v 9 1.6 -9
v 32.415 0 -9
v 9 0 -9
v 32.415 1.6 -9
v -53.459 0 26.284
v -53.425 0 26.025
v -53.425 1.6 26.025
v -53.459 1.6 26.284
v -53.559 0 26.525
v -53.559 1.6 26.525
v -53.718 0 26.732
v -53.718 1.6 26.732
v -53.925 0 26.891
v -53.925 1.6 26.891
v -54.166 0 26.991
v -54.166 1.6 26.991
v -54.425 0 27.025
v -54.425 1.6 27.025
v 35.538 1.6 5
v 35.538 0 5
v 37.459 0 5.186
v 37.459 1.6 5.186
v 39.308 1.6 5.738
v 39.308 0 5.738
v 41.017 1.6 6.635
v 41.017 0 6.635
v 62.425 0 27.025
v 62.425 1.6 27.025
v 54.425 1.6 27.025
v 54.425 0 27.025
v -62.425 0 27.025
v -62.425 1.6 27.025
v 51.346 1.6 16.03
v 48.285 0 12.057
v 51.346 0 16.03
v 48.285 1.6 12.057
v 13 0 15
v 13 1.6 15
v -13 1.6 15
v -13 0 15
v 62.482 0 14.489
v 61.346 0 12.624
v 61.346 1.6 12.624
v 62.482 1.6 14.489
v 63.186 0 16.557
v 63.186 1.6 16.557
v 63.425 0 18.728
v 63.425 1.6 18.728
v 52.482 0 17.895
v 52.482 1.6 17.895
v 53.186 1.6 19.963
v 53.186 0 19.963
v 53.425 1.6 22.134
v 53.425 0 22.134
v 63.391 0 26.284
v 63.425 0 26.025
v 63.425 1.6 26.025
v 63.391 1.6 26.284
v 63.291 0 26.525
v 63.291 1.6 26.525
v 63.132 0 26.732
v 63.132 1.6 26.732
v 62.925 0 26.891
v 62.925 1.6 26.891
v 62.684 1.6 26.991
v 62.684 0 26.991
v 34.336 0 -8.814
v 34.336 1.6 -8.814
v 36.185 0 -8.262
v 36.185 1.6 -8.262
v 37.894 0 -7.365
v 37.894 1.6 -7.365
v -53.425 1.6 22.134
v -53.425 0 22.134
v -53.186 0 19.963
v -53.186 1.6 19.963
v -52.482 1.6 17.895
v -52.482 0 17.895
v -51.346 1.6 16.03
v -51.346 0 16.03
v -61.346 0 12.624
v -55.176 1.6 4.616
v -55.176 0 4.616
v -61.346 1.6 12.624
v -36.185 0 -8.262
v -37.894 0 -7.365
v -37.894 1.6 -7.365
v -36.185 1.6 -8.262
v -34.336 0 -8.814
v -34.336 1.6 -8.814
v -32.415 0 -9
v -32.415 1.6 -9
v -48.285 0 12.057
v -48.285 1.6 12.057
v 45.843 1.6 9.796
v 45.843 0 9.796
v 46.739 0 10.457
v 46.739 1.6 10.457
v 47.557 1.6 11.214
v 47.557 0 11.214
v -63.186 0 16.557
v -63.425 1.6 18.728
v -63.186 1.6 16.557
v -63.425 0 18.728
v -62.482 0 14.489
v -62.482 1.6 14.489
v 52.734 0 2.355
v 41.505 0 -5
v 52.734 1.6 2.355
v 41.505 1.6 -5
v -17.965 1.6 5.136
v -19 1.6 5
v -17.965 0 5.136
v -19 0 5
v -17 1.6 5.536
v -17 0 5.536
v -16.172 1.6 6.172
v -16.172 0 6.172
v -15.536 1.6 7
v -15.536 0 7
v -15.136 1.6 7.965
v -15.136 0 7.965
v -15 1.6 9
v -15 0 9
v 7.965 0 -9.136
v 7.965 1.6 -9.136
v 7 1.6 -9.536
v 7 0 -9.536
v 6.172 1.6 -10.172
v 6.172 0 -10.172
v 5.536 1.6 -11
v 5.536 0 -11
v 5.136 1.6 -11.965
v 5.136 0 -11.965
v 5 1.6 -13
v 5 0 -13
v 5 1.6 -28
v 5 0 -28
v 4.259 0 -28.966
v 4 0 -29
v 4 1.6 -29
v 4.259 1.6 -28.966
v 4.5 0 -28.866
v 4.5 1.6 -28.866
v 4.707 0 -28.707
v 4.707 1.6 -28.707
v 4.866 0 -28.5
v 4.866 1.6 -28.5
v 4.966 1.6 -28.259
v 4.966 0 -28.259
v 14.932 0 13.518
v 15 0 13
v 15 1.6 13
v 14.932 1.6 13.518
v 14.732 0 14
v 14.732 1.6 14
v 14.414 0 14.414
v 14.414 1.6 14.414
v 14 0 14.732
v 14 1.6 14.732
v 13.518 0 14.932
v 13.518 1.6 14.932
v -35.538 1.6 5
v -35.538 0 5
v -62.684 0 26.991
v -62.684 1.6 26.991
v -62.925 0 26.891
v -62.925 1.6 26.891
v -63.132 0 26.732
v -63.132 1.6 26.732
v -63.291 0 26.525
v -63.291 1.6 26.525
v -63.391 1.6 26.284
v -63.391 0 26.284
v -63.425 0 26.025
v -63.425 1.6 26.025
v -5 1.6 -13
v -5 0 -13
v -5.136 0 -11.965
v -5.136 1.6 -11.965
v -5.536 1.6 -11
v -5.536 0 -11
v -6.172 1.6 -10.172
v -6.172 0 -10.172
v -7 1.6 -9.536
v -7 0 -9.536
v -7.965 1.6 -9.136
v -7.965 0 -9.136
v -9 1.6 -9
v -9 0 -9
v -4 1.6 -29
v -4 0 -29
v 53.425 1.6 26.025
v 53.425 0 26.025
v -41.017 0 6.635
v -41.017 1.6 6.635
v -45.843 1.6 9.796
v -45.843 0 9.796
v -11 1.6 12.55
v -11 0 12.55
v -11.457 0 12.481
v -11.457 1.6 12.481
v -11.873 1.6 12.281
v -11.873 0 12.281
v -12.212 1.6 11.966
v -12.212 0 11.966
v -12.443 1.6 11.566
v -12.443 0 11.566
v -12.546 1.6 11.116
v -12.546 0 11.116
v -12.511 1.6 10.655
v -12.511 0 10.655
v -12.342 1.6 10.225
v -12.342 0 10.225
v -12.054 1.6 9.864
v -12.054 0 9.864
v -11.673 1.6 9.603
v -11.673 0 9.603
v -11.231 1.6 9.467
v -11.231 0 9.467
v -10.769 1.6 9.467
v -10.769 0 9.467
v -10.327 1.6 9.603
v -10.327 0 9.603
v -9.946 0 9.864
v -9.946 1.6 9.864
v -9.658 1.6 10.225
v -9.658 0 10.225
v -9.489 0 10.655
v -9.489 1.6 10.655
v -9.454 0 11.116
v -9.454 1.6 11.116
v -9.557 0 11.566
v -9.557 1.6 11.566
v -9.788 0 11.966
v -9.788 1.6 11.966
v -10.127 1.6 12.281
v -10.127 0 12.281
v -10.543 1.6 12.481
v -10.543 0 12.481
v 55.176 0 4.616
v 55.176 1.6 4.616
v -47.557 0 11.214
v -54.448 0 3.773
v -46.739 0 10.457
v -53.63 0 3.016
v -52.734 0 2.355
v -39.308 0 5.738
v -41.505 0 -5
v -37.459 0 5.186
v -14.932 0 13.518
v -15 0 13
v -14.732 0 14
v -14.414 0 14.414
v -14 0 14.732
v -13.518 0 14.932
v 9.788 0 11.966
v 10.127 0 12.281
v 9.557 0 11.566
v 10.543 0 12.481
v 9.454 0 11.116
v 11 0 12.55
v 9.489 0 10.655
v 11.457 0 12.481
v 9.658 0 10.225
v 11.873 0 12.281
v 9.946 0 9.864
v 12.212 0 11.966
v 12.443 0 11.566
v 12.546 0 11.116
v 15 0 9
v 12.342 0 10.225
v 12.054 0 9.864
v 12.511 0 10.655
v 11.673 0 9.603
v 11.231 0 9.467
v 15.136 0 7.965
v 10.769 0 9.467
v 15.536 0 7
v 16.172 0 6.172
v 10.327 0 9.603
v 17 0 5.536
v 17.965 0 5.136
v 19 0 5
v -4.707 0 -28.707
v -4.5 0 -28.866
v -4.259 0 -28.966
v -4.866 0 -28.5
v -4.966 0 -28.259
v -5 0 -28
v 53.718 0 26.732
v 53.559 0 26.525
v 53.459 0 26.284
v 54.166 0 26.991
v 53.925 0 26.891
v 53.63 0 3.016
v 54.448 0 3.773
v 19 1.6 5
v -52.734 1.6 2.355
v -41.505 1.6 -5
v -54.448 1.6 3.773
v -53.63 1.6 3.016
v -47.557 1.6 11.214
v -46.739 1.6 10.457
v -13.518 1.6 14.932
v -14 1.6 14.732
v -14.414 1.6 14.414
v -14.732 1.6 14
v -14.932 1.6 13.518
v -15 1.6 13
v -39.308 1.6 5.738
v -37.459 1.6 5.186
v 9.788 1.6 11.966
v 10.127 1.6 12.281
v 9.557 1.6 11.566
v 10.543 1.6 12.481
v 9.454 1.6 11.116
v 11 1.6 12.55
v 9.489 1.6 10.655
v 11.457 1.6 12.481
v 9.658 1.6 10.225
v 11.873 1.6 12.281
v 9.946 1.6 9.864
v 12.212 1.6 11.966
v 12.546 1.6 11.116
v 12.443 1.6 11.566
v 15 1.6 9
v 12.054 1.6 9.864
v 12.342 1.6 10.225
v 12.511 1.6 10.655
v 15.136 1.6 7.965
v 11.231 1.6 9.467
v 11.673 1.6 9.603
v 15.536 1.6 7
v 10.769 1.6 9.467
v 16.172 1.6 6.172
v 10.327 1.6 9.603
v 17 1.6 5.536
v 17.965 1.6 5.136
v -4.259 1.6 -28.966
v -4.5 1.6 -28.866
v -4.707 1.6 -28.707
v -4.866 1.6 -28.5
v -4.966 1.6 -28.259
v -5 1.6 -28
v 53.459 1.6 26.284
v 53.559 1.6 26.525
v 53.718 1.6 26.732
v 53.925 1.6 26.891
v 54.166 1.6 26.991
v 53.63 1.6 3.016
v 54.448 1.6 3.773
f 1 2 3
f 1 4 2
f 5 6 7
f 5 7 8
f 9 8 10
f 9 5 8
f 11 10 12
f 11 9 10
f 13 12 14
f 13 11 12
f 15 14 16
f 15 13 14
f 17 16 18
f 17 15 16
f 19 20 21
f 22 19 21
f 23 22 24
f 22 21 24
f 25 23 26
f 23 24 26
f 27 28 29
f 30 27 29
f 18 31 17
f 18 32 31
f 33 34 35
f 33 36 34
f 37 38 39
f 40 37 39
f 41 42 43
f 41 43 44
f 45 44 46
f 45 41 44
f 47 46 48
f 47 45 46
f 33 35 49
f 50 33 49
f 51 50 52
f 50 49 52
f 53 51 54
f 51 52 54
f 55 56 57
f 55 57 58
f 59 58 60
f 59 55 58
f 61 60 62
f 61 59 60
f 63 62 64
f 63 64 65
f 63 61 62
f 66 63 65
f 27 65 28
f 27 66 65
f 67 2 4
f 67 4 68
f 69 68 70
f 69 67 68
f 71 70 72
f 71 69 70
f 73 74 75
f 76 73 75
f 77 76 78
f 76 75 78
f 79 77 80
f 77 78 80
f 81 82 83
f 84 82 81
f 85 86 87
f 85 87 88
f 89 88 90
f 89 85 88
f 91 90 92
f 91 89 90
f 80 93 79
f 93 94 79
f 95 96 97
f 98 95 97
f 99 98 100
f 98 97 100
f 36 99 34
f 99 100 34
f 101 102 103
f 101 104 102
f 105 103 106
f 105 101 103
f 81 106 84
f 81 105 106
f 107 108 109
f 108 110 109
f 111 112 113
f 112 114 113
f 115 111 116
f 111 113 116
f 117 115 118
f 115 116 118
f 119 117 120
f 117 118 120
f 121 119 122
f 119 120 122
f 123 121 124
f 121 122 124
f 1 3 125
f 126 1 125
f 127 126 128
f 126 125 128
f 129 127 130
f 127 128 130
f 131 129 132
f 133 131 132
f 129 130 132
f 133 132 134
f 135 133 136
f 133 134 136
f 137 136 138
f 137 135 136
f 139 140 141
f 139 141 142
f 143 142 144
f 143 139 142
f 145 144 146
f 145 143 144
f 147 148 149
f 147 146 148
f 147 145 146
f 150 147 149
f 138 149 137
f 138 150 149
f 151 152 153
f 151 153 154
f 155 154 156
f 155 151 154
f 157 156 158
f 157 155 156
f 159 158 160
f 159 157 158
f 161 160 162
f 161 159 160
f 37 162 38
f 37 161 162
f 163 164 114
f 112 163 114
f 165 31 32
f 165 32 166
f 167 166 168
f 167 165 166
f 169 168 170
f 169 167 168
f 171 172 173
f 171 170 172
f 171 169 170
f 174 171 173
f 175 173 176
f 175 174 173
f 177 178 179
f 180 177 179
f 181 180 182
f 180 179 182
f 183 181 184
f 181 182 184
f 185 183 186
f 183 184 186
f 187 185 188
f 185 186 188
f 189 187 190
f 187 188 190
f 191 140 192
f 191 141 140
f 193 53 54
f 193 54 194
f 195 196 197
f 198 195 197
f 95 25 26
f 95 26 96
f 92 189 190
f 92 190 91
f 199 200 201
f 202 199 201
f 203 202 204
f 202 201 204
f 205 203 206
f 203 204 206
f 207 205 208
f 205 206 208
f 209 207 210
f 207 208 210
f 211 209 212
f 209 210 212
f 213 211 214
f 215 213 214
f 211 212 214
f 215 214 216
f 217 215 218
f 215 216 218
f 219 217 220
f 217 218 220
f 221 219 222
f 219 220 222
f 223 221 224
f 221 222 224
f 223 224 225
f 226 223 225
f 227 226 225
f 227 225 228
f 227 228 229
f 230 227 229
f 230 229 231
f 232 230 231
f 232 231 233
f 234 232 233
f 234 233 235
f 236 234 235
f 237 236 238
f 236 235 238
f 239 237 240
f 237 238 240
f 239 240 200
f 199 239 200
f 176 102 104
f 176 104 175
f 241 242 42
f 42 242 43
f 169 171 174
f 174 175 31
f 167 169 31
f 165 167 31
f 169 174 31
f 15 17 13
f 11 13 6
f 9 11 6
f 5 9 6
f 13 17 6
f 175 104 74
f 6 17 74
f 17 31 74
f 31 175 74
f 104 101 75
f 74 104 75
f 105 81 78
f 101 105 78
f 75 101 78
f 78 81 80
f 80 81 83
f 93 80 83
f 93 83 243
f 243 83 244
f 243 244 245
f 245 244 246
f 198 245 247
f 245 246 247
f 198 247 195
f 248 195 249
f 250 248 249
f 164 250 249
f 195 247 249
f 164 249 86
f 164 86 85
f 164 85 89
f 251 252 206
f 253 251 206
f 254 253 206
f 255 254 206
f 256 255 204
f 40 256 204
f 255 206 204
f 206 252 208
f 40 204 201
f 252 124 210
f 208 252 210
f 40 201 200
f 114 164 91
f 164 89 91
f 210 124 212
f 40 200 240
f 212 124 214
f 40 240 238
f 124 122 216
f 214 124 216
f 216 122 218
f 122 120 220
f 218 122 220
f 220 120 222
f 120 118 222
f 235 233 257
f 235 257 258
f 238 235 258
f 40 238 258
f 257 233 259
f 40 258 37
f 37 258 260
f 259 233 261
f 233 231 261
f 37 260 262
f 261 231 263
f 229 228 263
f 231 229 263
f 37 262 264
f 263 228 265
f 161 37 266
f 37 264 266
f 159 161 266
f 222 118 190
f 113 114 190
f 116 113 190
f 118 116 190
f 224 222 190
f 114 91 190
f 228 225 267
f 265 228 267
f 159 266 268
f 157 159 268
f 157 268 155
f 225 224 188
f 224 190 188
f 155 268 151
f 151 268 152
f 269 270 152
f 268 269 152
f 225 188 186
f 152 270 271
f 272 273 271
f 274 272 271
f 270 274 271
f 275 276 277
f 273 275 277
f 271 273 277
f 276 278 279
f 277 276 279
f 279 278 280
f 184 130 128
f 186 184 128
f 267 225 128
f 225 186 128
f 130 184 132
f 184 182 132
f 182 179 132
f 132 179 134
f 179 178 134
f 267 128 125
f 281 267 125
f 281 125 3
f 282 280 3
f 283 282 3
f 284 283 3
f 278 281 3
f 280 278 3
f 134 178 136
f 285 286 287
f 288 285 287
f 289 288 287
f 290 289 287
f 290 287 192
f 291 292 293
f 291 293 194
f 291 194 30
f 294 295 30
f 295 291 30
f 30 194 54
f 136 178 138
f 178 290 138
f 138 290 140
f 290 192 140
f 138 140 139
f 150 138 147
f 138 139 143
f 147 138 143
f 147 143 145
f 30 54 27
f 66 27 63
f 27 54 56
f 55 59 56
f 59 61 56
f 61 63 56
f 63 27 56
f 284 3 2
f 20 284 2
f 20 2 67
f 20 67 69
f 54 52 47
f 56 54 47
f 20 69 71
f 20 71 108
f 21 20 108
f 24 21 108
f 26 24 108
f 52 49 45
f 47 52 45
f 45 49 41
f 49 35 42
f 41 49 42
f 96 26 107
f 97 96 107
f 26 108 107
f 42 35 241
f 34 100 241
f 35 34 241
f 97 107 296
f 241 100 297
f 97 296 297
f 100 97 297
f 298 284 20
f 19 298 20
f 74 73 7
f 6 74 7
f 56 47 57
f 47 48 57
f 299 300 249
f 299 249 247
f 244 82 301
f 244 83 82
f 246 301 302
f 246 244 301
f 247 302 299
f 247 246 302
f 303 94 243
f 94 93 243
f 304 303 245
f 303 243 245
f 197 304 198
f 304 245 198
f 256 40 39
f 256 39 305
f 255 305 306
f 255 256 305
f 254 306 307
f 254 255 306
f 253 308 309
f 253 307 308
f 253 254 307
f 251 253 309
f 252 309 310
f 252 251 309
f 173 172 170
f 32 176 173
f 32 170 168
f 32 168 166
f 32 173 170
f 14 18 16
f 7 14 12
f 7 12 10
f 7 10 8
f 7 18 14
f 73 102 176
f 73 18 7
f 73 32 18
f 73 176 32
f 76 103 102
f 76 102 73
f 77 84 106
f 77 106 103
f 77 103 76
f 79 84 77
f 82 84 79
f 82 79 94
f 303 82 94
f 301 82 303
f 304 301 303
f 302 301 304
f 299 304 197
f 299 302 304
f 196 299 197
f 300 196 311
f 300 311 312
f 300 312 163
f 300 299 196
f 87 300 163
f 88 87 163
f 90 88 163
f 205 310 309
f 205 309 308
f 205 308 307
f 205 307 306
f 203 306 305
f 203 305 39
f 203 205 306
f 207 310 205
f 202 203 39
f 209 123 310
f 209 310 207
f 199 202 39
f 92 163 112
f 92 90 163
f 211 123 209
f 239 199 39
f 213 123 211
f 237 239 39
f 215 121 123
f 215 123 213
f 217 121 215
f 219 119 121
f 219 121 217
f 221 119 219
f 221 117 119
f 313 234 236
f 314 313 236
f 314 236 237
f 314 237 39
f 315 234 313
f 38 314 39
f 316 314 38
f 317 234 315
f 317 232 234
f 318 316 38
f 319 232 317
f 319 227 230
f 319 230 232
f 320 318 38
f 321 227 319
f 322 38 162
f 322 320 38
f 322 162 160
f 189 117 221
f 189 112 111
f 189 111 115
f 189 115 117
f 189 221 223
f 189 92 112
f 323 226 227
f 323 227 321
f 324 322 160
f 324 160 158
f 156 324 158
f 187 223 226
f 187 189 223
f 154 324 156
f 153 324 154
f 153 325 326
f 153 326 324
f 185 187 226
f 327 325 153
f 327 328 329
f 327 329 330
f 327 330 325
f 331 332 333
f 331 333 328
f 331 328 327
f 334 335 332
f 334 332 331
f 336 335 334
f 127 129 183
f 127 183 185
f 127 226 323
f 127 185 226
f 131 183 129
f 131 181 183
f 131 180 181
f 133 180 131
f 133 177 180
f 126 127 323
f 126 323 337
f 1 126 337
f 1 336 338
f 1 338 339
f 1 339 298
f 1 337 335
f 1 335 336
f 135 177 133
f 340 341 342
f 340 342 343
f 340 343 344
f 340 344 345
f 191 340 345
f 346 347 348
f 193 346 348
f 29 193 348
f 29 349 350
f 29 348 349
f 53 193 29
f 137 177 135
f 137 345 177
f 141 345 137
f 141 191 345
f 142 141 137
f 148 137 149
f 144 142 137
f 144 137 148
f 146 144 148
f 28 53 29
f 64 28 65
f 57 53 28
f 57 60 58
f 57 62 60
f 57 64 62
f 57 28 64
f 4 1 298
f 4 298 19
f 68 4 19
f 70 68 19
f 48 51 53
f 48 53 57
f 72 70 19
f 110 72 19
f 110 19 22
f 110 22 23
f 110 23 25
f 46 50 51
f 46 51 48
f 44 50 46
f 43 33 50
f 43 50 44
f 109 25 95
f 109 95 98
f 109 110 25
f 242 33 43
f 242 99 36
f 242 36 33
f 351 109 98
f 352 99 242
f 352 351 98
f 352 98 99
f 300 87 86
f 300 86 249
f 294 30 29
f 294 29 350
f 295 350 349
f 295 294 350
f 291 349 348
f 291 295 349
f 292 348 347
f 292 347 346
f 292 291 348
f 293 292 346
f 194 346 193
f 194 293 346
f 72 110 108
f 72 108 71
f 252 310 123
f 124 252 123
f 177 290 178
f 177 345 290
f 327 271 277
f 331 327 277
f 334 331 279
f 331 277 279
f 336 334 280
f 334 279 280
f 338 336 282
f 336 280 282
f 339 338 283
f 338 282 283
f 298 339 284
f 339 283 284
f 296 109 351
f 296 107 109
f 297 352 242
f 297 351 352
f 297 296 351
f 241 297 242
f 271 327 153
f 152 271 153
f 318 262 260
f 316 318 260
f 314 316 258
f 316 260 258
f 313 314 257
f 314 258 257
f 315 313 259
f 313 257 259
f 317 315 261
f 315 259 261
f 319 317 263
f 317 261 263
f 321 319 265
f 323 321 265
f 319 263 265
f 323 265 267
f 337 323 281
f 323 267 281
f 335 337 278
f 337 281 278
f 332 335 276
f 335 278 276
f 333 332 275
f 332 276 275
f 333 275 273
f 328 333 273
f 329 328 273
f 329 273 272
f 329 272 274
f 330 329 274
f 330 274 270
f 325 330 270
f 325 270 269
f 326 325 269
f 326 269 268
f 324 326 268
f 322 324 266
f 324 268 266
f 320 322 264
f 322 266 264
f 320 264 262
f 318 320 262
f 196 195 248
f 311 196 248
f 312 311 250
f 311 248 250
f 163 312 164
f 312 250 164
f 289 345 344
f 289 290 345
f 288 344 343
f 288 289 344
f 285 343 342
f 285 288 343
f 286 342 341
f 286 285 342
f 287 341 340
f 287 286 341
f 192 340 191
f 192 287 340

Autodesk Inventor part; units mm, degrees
ref_plane "YZ Plane" through (0, 0, 0) normal (1, 0, 0) x (0, 1, 0)
ref_plane "XZ Plane" through (0, 0, 0) normal (0, 1, 0) x (-1, 0, 0)
ref_plane "XY Plane" through (0, 0, 0) normal (0, 0, 1) x (1, 0, 0)
sketch "Szkic2" plane through (0, 0, 0) normal (0, 1, 0) x (-1, 0, 0)
  line L0 (47.5, 5) -> (-47.5, 5)
  line L1 (-47.5, 5) -> (-47.5, -5)
  line L2 (-47.5, -5) -> (47.5, -5)
  line L3 (47.5, -5) -> (47.5, 5)
  line L4 (47.5, 5) -> (-47.5, -5) construction
  line L5 (-47.5, 5) -> (47.5, -5) construction
  line L6 (0, 24) -> (0, -27)
  point P0 (0, 0)
  dimension "d10" = 10
  dimension "d11" = 95
extrude "Wyciągnięcie proste2" add sketch "Szkic2" along normal blind 1.6
sketch "Szkic3" plane through (0, 1.6, 0) normal (0, 1, 0) x (1, 0, 0)
  line L0 (-47.5, -5) -> (47.5, -5) projected
  line L1 (47.5, -5) -> (47.5, 5) projected
  line L2 (47.5, 5) -> (-47.5, 5) projected
  line L3 (-47.5, 5) -> (-47.5, -5) projected
  line L4 (52, -8.65) -> (49.4, -5.35) construction
  line L5 (59.75, -18.7) -> (57.1, -15.35) construction
  line L6 (41.3, -1.65) -> (38.65, 1.7) construction
  line L7 (58.425, -17.025) -> (50.7, -7) construction
  line L8 (39.975, 0.025) -> (50.7, -7) construction
  line L9 (58.425, -17.025) -> (58.425, -30) construction
  line L10 (38.5214, -5) -> (47.2545, -10.7203)
  line L11 (47.2545, -10.7203) -> (53.425, -18.728)
  line L12 (53.425, -18.728) -> (53.425, -27.025)
  line L13 (41.5049, 5) -> (54.1455, -3.2797)
  line L14 (54.1455, -3.2797) -> (63.425, -15.322)
  line L15 (63.425, -15.322) -> (63.425, -27.025)
  line L16 (63.425, -27.025) -> (53.425, -27.025)
  line L17 (0, -5) -> (0, 20.232)
  line L18 (-38.5214, -5) -> (-47.2545, -10.7203)
  line L19 (-47.2545, -10.7203) -> (-53.425, -18.728)
  line L20 (-53.425, -18.728) -> (-53.425, -27.025)
  line L21 (-41.5049, 5) -> (-54.1455, -3.2797)
  line L22 (-54.1455, -3.2797) -> (-63.425, -15.322)
  line L23 (-63.425, -15.322) -> (-63.425, -27.025)
  line L24 (-63.425, -27.025) -> (-53.425, -27.025)
  point P0 (0, 0)
  point P1 (-47.5, 1.0732)
  point P2 (47.5, 1.0732)
  dimension "d17" = 5
  dimension "d18" = 5
  dimension "d19" = 10
extrude "Wyciągnięcie proste3" add sketch "Szkic3" against normal up to surface (1.6 mm away) contours L0 L18 L19 L20 L24 L23 L22 L21 L3 | L0 L1 L13 L14 L15 L16 L12 L11 L10
extrude "Wyciągnięcie proste4" cut sketch "Szkic3" against normal through all contours L3 L2 L21 | L2 L1 L13
sketch "Szkic4" plane through (0, 1.6, 0) normal (0, 1, 0) x (1, 0, 0)
  line L0 (-41.5049, 5) -> (-54.1455, -3.2797) projected
  line L1 (-54.1455, -3.2797) -> (-63.425, -15.322) projected
  line L2 (-63.425, -15.322) -> (-63.425, -27.025) projected
  line L3 (-63.425, -27.025) -> (-53.425, -27.025) projected
  line L4 (-53.425, -27.025) -> (-53.425, -18.728) projected
  line L5 (-53.425, -18.728) -> (-47.2545, -10.7203) projected
  line L6 (-47.2545, -10.7203) -> (-38.5214, -5) projected
  line L7 (-38.5214, -5) -> (38.5214, -5) projected
  line L8 (38.5214, -5) -> (47.2545, -10.7203) projected
  line L9 (47.2545, -10.7203) -> (53.425, -18.728) projected
  line L10 (53.425, -18.728) -> (53.425, -27.025) projected
  line L11 (53.425, -27.025) -> (63.425, -27.025) projected
  line L12 (63.425, -27.025) -> (63.425, -15.322) projected
  line L13 (63.425, -15.322) -> (54.1455, -3.2797) projected
  line L14 (54.1455, -3.2797) -> (41.5049, 5) projected
  line L15 (41.5049, 5) -> (-41.5049, 5) projected
  line L16 (41.5049, 5) -> (35.3982, 9)
  line L17 (35.3982, 9) -> (-35.3982, 9)
  line L18 (-35.3982, 9) -> (-41.5049, 5)
  point P0 (0, 0)
  dimension "d24" = 4
extrude "Wyciągnięcie proste5" add sketch "Szkic4" against normal up to surface (1.6 mm away) contours L18 L17 L16 L15
sketch "Szkic5" plane through (0, 1.6, 0) normal (0, 1, 0) x (1, 0, 0)
  line L0 (-35.3982, 9) -> (-54.1455, -3.2797) projected
  line L1 (-54.1455, -3.2797) -> (-63.425, -15.322) projected
  line L2 (-63.425, -15.322) -> (-63.425, -27.025) projected
  line L3 (-63.425, -27.025) -> (-53.425, -27.025) projected
  line L4 (-53.425, -27.025) -> (-53.425, -18.728) projected
  line L5 (-53.425, -18.728) -> (-47.2545, -10.7203) projected
  line L6 (-47.2545, -10.7203) -> (-38.5214, -5) projected
  line L7 (-38.5214, -5) -> (38.5214, -5) projected
  line L8 (38.5214, -5) -> (47.2545, -10.7203) projected
  line L9 (47.2545, -10.7203) -> (53.425, -18.728) projected
  line L10 (53.425, -18.728) -> (53.425, -27.025) projected
  line L11 (53.425, -27.025) -> (63.425, -27.025) projected
  line L12 (63.425, -27.025) -> (63.425, -15.322) projected
  line L13 (63.425, -15.322) -> (54.1455, -3.2797) projected
  line L14 (54.1455, -3.2797) -> (35.3982, 9) projected
  line L15 (35.3982, 9) -> (-35.3982, 9) projected
  line L16 (-15, -5) -> (15, -5)
  line L17 (15, -5) -> (15, -15)
  line L18 (15, -15) -> (-15, -15)
  line L19 (-15, -15) -> (-15, -5)
  point P0 (0, 0)
  point P1 (0, -5)
  point P2 (0, 0)
  point P3 (0, -5)
  point P4 (0, -5)
  dimension "d27" = 30
  dimension "d28" = 10
extrude "Wyciągnięcie proste6" add sketch "Szkic5" against normal up to surface (1.6 mm away) contours L7 L17 L18 L19
fillet "Zaokrąglenie1" radius 10 12 edges at (-63.425, 0.8, 15.322) (-54.1455, 0.8, 3.2797) (-35.3982, 0.8, -9) (35.3982, 0.8, -9) (54.1455, 0.8, 3.2797) (63.425, 0.8, 15.322) (-53.425, 0.8, 18.728) (-47.2545, 0.8, 10.7203) (-38.5214, 0.8, 5) (38.5214, 0.8, 5) (47.2545, 0.8, 10.7203) (53.425, 0.8, 18.728)
fillet "Zaokrąglenie2" radius 4 2 edges at (-15, 0.8, 5) (15, 0.8, 5)
fillet "Zaokrąglenie3" radius 2 2 edges at (15, 0.8, 15) (-15, 0.8, 15)
sketch "Szkic6" plane through (0, 1.6, 0) normal (0, 1, 0) x (1, 0, 0)
  line L0 (32.4146, 9) -> (-32.4146, 9) projected
  line L1 (-5, 9) -> (5, 9)
  line L2 (5, 9) -> (5, 29)
  line L3 (5, 29) -> (-5, 29)
  line L4 (-5, 29) -> (-5, 9)
  point P0 (0, 0)
  point P1 (0, 9)
  point P2 (0, 9)
  dimension "d34" = 10
  dimension "d35" = 20
extrude "Wyciągnięcie proste7" add sketch "Szkic6" against normal up to surface (1.6 mm away)
fillet "Zaokrąglenie4" radius 4 2 edges at (5, 0.8, -9) (-5, 0.8, -9)
fillet "Zaokrąglenie5" radius 1 2 edges at (5, 0.8, -29) (-5, 0.8, -29)
fillet "Zaokrąglenie6" radius 1 4 edges at (-63.425, 0.8, 27.025) (-53.425, 0.8, 27.025) (53.425, 0.8, 27.025) (63.425, 0.8, 27.025)
sketch "Szkic7" plane through (0, 1.6, 0) normal (0, 1, 0) x (1, 0, 0)
  line L0 (-13, -15) -> (13, -15) projected
  line L1 (15, -13) -> (15, -9) projected
  line L2 (-15, -9) -> (-15, -13) projected
  point P0 (0, 0)
  point P1 (-11, -11)
  point P2 (11, -11)
  dimension "d41" = 4
  dimension "d42" = 4
  dimension "d43" = 4
  dimension "d44" = 4
hole "Otwór1" at (-11, 1.6, 11) at (11, 1.6, 11) direction (0, -1, 0) diameter 3.1 depth 15 tip angle 118
properties part number "przód"
